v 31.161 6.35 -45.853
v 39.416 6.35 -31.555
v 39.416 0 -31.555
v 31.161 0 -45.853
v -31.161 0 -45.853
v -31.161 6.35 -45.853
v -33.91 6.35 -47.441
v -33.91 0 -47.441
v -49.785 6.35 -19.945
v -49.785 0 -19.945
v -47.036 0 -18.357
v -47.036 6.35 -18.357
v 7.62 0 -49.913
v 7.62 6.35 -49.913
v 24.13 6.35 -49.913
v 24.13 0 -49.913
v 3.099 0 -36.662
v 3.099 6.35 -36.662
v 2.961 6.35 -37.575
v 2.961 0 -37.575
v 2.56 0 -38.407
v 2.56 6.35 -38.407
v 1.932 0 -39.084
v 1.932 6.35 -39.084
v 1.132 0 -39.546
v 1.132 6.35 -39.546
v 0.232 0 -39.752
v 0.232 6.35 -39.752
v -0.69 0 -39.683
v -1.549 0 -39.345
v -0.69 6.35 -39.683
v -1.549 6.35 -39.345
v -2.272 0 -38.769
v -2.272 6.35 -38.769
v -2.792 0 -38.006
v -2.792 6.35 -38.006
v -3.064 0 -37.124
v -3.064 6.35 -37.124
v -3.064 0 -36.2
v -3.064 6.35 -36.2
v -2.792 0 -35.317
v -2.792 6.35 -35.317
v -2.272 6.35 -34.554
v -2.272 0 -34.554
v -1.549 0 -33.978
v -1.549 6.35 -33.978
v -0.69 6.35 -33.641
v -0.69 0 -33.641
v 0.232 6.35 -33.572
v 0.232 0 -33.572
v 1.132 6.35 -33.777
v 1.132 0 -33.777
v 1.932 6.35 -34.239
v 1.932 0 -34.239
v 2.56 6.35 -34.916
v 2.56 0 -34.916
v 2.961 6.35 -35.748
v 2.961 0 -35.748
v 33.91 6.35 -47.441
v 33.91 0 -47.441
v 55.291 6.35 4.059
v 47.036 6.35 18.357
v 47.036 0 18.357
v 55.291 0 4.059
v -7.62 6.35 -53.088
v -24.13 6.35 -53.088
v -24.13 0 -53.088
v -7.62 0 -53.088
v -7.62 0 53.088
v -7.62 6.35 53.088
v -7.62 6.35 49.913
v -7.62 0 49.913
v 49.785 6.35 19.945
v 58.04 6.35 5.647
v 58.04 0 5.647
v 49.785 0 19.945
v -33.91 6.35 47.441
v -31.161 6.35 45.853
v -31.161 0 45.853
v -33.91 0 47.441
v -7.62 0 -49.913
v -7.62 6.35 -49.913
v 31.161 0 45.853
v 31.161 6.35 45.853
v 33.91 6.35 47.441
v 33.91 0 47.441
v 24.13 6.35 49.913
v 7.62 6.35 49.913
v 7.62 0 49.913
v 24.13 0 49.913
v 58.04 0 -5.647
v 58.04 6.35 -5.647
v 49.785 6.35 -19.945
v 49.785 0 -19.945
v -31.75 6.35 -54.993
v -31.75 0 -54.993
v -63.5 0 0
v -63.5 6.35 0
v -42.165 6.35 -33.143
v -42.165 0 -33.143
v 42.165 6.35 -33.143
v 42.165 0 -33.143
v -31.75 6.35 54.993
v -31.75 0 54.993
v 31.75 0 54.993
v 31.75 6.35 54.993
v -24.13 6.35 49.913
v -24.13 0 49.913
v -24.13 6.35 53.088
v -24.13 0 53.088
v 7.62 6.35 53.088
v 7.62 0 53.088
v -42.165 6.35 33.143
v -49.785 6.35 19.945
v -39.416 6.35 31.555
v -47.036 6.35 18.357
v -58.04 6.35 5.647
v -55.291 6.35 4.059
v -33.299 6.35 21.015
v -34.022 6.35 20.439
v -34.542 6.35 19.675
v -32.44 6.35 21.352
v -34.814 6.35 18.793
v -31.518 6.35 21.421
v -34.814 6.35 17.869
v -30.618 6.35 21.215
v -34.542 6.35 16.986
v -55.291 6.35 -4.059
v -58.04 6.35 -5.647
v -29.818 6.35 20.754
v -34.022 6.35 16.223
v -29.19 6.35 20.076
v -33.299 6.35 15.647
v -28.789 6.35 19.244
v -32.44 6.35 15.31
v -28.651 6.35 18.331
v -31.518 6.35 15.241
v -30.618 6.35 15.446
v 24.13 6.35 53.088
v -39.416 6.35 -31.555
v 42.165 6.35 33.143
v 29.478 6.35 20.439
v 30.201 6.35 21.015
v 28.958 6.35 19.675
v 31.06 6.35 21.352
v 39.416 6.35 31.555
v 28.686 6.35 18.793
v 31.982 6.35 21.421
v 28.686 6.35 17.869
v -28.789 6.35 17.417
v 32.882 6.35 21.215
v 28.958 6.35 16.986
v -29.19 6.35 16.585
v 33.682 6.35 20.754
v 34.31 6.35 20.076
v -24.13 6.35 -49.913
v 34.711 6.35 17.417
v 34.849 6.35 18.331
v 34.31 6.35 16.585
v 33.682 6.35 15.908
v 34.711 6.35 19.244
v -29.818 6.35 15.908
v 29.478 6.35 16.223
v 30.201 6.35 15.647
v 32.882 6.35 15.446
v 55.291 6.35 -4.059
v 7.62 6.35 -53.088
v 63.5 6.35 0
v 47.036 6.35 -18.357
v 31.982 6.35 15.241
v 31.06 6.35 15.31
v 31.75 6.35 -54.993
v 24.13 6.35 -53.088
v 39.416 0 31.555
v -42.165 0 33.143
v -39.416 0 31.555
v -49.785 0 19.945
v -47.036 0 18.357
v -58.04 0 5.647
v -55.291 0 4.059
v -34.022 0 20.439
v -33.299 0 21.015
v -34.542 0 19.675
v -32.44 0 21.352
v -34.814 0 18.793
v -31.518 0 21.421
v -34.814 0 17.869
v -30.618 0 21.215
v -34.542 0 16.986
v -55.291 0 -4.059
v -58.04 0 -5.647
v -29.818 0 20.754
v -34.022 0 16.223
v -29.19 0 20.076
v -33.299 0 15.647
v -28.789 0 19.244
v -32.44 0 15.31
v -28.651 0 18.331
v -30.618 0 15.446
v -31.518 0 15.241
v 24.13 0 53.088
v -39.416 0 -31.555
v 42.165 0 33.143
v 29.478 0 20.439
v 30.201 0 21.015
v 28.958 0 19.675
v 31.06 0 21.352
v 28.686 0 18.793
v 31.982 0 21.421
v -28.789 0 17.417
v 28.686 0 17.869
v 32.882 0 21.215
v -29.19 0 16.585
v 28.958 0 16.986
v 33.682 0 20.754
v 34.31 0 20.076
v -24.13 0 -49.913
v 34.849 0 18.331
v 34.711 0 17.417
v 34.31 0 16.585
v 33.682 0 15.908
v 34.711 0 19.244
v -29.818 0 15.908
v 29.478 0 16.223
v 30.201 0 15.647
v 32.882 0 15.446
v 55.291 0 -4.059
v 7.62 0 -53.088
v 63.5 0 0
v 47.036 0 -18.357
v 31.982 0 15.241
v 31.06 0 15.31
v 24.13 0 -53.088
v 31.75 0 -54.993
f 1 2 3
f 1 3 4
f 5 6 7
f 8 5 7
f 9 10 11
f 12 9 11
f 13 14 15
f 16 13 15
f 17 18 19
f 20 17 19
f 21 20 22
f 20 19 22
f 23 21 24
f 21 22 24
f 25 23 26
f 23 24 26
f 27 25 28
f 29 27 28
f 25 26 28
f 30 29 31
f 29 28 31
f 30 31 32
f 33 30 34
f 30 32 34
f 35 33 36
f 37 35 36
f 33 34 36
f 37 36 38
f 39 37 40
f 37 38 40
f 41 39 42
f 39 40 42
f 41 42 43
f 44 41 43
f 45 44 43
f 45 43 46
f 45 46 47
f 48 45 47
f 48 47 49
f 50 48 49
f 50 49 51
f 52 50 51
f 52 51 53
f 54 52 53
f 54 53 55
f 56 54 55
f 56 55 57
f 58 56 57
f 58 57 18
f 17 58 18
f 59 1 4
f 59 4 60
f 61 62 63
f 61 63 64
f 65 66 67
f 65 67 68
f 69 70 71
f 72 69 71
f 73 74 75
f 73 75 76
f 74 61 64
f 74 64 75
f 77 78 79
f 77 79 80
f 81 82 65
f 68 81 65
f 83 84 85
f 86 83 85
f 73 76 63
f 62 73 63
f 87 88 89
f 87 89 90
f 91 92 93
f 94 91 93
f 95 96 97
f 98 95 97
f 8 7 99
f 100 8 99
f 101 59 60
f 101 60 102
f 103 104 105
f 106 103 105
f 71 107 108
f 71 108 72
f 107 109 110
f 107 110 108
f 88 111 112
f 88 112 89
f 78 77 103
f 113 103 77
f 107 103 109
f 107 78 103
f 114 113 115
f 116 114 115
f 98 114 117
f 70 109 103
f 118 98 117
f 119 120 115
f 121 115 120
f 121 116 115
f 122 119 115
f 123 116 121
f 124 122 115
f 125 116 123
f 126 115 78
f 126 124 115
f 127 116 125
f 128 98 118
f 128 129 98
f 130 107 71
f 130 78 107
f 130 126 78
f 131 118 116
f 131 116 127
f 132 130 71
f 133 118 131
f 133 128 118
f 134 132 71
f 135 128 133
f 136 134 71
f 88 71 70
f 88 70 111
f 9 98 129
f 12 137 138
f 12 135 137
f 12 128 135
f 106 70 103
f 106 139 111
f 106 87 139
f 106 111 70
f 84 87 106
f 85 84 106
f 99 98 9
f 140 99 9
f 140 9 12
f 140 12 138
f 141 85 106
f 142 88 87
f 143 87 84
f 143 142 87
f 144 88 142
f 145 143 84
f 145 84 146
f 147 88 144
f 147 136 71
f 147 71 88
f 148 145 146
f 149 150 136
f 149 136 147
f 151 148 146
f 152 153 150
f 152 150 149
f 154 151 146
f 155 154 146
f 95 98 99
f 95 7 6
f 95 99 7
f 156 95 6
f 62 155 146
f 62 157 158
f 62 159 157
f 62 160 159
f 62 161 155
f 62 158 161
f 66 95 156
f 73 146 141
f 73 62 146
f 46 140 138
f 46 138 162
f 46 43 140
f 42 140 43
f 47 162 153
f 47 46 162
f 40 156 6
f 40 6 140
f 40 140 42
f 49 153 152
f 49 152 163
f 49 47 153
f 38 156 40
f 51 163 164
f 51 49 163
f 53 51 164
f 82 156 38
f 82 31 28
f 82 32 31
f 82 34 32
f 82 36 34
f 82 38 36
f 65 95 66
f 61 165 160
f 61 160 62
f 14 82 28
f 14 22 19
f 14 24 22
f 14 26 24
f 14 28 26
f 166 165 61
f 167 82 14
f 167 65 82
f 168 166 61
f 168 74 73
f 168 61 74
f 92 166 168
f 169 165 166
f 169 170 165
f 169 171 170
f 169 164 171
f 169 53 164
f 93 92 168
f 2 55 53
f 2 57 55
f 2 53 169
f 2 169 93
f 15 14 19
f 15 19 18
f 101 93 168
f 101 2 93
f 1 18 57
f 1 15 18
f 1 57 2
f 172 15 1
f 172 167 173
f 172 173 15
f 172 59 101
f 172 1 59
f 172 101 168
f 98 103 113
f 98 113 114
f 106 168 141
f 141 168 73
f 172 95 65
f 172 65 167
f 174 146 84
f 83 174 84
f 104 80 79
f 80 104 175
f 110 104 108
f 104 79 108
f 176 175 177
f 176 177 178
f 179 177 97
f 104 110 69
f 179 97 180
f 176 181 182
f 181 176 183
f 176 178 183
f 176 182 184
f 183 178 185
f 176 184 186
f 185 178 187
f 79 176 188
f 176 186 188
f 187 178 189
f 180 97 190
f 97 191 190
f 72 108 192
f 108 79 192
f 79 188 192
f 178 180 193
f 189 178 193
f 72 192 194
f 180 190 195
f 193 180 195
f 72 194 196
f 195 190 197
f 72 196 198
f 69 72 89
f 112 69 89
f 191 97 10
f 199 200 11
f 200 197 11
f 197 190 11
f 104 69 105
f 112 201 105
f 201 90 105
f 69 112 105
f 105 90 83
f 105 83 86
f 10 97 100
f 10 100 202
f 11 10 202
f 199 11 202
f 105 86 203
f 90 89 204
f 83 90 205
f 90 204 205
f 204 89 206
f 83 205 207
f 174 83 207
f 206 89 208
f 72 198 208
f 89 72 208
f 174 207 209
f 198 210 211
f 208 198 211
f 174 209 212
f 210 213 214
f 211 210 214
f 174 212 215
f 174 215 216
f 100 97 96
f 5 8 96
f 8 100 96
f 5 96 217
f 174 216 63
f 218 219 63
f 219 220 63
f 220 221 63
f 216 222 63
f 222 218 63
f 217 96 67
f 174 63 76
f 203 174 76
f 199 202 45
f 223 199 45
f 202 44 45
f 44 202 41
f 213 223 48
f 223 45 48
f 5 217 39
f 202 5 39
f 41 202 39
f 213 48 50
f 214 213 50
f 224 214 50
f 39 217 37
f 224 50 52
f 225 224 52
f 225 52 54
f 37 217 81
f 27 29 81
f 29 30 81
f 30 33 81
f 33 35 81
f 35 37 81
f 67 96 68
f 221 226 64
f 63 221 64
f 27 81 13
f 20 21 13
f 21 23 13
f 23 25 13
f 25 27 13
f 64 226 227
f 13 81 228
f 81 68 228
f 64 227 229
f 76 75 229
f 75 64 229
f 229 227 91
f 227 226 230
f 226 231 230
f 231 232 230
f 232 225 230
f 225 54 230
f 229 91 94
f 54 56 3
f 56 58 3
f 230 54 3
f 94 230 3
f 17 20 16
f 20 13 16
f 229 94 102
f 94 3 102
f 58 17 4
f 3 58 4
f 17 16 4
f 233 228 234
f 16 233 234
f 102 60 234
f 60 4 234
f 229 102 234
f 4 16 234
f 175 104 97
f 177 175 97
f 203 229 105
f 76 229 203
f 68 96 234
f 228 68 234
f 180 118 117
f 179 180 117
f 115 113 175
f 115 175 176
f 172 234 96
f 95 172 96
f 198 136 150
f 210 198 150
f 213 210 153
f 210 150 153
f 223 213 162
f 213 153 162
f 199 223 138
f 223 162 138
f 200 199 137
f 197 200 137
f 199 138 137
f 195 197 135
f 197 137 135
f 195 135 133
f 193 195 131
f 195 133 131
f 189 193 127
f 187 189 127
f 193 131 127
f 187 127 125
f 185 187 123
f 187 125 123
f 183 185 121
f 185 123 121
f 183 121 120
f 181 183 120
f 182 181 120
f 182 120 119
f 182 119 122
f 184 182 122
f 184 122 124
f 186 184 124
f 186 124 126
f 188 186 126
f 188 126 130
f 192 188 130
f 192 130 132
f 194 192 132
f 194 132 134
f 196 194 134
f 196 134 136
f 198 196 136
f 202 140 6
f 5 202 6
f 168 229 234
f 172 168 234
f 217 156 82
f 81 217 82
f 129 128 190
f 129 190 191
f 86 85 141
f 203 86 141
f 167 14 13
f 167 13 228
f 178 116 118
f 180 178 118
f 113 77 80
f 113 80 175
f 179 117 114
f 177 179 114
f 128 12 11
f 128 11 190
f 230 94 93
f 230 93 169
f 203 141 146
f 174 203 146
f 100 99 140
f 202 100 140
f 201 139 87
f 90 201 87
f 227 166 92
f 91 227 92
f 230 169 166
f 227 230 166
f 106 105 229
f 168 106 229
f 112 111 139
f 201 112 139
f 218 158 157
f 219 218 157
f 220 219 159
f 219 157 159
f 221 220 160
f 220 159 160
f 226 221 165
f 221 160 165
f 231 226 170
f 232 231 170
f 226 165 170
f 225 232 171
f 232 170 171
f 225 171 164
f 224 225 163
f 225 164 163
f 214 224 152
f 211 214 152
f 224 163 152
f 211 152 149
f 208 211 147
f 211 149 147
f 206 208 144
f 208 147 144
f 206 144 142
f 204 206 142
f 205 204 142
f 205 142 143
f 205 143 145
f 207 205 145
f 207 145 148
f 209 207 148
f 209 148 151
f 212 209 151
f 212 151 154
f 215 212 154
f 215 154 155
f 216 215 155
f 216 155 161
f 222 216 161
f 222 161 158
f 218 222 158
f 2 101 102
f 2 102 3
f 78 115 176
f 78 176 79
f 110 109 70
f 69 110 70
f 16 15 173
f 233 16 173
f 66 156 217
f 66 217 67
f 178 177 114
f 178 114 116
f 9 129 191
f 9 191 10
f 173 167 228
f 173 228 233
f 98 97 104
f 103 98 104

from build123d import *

# Parameters (mm, degrees)
BOSS_EXTRUDE1_DEPTH = 6.35
SKETCH2_R           = 3.0988
SKETCH2_W           = 16.51
SKETCH2_H           = 3.175
CUT_EXTRUDE1_DEPTH  = 7.35


with BuildPart() as part:
    # Sketch1 → Boss-Extrude1 (new body)
    with BuildSketch(Plane(origin=(0, 0, 0), x_dir=(1, 0, 0), z_dir=(0, 1, 0))):
        Polygon((-63.5, 0), (-31.75, -54.99261314), (31.75, -54.99261314), (63.5, 0), (31.75, 54.99261314), (-31.75, 54.99261314), align=None)
    extrude(amount=BOSS_EXTRUDE1_DEPTH)

    # Sketch2 → Cut-Extrude1 (cut, through all)
    with BuildSketch(Plane(origin=(0, 6.35, 0), x_dir=(1, 0, 0), z_dir=(0, 1, 0))):
        with Locations((-31.75, -18.330871047)):
            Circle(SKETCH2_R)
        with Locations((0, 36.661742094)):
            Circle(SKETCH2_R)
        with Locations((31.75, -18.330871047)):
            Circle(SKETCH2_R)
        Polygon((-55.290590949, -4.059113577), (-58.040221606, -5.646613577), (-49.785221606, -19.944692993), (-47.035590949, -18.357192993), align=None)
        Polygon((-31.160590949, -45.853499563), (-33.910221606, -47.440999563), (-42.165221606, -33.142920147), (-39.415590949, -31.555420147), align=None)
        Polygon((-31.160590949, 45.853499563), (-33.910221606, 47.440999563), (-42.165221606, 33.142920147), (-39.415590949, 31.555420147), align=None)
        Polygon((-49.785221606, 19.944692993), (-47.035590949, 18.357192993), (-55.290590949, 4.059113577), (-58.040221606, 5.646613577), align=None)
        with Locations((15.875, 51.50011314)):
            Rectangle(SKETCH2_W, SKETCH2_H)
        with Locations((-15.875, 51.50011314)):
            Rectangle(SKETCH2_W, SKETCH2_H)
        Polygon((55.290590949, 4.059113577), (58.040221606, 5.646613577), (49.785221606, 19.944692993), (47.035590949, 18.357192993), align=None)
        Polygon((42.165221606, 33.142920147), (39.415590949, 31.555420147), (31.160590949, 45.853499563), (33.910221606, 47.440999563), align=None)
        Polygon((31.160590949, -45.853499563), (33.910221606, -47.440999563), (42.165221606, -33.142920147), (39.415590949, -31.555420147), align=None)
        Polygon((49.785221606, -19.944692993), (47.035590949, -18.357192993), (55.290590949, -4.059113577), (58.040221606, -5.646613577), align=None)
        with Locations((-15.875, -51.50011314)):
            Rectangle(SKETCH2_W, SKETCH2_H)
        with Locations((15.875, -51.50011314)):
            Rectangle(SKETCH2_W, SKETCH2_H)
    extrude(amount=-CUT_EXTRUDE1_DEPTH, mode=Mode.SUBTRACT)


solid = part.part
